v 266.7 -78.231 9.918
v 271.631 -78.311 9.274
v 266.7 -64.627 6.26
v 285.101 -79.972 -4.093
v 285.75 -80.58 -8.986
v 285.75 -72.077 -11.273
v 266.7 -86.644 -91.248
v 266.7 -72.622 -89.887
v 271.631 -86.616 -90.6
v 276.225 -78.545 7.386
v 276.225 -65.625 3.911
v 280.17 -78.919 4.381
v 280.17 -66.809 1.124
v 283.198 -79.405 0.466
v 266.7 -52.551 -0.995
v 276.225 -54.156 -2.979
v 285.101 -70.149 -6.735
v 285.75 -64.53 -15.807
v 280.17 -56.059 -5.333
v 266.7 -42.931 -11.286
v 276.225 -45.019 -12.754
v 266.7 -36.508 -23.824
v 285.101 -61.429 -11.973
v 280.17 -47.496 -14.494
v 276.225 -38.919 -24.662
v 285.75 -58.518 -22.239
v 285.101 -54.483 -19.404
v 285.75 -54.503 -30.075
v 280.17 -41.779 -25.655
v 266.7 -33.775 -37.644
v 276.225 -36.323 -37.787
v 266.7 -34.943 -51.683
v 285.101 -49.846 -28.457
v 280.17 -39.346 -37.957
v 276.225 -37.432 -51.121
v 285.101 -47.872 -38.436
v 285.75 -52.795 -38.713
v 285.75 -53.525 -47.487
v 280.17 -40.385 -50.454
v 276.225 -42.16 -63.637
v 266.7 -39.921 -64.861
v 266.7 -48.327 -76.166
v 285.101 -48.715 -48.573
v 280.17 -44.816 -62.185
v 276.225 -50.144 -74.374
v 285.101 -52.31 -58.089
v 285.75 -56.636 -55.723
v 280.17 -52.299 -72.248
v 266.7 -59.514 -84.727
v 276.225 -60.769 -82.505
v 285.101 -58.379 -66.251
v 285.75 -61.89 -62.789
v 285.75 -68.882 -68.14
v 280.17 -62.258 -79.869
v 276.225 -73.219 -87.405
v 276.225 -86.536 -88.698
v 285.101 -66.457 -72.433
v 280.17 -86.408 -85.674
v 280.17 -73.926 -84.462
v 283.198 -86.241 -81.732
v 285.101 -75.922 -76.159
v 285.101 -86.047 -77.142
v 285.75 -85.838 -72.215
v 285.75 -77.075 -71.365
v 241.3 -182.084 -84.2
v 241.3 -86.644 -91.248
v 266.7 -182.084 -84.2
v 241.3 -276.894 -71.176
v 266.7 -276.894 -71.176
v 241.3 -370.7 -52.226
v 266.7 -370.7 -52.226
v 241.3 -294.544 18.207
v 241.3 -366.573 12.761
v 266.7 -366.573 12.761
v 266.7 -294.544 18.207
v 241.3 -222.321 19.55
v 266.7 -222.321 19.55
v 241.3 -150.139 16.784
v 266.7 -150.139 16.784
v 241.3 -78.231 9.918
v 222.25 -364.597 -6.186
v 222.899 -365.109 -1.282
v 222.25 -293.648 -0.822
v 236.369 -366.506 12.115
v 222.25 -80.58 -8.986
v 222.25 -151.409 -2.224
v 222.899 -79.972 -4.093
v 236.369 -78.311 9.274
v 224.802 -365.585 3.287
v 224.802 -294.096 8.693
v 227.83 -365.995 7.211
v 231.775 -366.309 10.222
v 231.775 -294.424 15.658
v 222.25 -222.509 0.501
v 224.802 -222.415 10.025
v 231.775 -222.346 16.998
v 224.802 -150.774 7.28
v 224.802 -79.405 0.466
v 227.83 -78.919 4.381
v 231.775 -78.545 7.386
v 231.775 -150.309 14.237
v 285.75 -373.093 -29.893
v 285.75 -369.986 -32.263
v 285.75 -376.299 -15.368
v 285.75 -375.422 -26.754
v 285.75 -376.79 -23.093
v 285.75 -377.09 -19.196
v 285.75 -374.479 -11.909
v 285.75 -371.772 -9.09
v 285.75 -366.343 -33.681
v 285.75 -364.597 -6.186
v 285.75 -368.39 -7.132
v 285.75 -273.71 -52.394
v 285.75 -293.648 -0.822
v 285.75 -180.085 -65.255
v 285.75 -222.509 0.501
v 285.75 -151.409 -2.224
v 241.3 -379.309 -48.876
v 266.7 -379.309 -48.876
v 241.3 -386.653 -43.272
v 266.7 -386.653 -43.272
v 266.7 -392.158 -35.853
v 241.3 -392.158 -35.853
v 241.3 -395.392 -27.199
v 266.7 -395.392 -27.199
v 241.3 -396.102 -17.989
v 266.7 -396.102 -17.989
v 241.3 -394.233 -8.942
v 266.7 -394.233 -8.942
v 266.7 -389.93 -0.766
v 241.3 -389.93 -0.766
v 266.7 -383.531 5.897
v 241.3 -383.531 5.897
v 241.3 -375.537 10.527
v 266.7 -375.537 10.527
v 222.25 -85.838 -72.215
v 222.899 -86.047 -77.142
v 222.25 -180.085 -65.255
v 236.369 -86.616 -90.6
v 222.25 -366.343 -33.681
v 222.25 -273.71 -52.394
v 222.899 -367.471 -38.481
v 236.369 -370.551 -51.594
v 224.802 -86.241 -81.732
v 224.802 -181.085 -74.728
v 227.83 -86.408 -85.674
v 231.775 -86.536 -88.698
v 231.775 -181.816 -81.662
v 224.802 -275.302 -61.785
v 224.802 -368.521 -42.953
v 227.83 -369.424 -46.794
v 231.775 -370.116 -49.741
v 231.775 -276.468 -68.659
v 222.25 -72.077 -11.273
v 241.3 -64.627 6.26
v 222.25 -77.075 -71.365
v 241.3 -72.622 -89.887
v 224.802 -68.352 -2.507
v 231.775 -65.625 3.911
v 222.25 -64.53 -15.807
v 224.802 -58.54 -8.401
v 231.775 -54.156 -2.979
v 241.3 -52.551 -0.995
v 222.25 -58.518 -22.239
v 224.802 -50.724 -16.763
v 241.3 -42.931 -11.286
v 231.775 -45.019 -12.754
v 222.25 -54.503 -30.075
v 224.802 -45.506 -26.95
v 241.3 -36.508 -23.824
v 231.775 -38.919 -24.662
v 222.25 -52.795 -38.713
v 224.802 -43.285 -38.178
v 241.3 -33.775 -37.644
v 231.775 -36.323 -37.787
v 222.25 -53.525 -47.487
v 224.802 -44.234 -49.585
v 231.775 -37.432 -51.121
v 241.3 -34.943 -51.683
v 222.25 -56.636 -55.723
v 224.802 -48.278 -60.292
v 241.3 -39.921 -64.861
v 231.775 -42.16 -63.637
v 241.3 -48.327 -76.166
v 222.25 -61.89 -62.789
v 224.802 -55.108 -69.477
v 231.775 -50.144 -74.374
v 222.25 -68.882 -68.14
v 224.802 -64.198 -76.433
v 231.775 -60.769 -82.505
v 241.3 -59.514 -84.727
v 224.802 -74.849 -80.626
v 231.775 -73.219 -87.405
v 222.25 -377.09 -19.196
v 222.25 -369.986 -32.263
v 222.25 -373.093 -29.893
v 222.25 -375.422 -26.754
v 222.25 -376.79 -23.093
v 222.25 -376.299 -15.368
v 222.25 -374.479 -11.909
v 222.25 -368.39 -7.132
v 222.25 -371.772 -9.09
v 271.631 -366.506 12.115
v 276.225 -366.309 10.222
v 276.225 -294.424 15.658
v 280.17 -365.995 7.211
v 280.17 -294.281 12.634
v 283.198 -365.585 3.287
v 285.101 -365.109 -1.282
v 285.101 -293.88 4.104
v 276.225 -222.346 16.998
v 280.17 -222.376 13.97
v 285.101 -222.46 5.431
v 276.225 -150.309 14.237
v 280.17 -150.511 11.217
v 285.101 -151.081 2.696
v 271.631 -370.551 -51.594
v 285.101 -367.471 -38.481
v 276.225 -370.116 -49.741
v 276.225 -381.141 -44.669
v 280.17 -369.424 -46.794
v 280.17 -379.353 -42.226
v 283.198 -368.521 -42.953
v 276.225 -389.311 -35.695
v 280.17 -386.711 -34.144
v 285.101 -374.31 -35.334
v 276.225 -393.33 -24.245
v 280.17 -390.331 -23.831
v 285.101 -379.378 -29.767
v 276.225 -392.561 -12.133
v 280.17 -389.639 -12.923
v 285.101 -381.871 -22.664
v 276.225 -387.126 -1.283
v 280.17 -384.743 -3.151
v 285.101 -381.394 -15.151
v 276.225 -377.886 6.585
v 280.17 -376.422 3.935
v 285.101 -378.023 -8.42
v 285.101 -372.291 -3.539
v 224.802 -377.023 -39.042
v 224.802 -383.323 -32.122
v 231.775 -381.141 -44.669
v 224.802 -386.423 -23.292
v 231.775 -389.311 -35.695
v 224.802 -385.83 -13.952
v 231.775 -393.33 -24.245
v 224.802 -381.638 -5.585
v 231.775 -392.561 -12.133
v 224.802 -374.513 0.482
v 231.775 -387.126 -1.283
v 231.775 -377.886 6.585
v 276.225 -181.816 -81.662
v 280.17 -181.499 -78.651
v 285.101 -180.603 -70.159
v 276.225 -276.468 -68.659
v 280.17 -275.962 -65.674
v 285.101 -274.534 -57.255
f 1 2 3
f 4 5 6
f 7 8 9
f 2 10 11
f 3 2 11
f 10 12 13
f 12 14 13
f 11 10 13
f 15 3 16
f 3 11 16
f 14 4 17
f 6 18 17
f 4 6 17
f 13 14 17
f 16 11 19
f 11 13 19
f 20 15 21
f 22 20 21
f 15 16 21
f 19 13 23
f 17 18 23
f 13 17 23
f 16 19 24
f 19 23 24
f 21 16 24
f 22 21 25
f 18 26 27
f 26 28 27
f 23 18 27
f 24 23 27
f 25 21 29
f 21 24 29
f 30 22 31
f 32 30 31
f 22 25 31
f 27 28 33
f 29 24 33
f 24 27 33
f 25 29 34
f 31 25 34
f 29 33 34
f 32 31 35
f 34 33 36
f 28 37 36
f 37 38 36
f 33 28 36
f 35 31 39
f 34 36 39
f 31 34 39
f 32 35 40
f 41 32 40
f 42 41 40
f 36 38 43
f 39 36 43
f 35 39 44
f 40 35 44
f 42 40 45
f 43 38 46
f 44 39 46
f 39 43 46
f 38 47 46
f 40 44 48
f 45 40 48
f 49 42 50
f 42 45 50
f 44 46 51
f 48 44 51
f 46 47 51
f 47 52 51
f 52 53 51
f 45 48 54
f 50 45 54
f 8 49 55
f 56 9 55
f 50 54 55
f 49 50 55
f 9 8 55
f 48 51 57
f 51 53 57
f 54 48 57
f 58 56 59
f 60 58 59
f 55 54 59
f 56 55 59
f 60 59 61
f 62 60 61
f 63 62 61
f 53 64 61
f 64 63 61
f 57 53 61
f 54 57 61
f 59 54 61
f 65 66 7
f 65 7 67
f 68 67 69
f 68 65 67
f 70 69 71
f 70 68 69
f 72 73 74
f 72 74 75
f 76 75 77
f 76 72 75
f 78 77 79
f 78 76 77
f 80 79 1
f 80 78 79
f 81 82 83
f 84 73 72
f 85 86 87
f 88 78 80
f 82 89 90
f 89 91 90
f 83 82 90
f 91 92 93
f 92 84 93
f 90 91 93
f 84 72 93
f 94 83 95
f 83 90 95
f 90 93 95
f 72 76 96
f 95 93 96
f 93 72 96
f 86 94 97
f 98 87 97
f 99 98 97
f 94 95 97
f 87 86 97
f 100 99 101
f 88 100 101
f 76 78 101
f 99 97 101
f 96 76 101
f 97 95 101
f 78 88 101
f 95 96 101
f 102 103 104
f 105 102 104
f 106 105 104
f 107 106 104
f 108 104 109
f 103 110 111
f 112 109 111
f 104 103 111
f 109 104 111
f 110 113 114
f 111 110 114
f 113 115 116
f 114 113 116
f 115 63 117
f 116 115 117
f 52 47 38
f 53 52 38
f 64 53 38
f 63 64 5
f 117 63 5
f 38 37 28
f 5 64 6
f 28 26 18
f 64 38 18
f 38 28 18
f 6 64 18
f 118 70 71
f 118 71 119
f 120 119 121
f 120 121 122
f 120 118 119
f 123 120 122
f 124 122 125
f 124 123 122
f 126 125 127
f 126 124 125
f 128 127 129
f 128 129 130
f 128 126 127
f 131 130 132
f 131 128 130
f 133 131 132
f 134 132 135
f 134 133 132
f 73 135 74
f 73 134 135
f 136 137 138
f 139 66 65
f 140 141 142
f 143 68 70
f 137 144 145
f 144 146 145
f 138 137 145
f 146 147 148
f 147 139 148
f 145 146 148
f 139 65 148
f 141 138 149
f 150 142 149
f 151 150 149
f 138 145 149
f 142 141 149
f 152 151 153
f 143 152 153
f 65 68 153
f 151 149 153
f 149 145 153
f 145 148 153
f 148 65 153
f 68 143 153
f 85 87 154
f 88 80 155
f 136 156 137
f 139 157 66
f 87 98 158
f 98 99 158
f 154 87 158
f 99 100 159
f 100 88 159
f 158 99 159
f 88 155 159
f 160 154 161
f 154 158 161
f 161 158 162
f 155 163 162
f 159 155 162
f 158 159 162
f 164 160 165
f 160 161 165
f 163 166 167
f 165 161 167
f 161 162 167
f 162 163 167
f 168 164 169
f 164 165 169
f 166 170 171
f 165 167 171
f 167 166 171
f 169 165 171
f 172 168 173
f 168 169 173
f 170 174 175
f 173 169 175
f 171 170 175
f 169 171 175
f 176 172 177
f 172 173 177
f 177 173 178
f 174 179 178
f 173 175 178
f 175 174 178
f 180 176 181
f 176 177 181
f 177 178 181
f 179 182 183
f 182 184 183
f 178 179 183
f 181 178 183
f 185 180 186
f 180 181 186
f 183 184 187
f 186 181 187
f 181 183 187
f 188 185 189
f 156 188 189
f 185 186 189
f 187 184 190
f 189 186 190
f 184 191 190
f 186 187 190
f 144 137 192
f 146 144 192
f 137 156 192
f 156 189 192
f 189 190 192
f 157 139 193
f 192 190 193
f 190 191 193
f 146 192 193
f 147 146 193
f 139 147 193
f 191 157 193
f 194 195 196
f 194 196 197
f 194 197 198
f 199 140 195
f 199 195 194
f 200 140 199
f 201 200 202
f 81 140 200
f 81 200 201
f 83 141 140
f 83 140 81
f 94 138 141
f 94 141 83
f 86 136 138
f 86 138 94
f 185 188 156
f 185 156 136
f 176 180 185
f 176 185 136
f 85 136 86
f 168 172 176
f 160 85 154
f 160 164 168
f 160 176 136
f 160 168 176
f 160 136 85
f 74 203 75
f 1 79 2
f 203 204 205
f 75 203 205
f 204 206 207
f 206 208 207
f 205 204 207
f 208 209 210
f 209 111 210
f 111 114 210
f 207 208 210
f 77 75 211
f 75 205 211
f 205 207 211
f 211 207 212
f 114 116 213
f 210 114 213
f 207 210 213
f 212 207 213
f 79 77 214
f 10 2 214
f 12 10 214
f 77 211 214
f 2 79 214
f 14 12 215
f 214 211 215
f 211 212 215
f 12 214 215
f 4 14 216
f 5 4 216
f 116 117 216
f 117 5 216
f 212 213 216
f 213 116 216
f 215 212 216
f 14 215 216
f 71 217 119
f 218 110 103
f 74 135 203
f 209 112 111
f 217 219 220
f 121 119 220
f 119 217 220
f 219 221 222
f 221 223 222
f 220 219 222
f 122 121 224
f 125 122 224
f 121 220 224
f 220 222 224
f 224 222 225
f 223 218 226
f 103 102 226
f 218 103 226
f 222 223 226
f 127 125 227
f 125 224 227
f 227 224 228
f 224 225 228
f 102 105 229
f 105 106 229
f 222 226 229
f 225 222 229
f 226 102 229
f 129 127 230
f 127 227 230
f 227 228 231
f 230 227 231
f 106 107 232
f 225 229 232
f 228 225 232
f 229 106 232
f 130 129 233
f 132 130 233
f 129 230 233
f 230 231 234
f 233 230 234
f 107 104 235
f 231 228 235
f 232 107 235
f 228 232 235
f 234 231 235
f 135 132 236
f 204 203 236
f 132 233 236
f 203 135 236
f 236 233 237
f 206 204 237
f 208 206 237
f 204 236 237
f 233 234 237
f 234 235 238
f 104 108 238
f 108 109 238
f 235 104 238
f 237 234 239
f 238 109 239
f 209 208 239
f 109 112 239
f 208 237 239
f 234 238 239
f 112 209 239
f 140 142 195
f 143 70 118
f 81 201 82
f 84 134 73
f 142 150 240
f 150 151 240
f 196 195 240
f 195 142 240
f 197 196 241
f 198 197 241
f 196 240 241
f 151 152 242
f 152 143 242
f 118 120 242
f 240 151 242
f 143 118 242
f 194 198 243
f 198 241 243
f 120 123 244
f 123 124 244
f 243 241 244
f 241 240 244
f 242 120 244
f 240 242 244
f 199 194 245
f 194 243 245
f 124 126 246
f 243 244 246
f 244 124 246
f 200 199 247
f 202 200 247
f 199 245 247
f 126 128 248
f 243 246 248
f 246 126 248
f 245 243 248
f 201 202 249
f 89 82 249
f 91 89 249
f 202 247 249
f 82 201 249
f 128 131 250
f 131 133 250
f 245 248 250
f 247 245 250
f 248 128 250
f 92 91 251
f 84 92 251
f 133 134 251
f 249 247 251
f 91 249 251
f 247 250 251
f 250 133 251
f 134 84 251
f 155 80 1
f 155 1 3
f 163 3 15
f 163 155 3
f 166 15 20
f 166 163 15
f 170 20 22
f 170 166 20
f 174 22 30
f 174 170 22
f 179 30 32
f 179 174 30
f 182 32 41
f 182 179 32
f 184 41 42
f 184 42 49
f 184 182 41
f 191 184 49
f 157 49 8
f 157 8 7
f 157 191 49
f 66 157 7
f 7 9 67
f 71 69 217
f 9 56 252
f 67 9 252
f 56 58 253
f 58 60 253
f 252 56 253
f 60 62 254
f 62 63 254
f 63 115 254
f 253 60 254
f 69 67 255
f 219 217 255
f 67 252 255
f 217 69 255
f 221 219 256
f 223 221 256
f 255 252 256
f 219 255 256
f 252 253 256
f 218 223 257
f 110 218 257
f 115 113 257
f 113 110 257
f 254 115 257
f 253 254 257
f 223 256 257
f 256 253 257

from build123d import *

# Parameters (mm, degrees)
BASE_EXTRUDE_DEPTH = 31.75
FILLET1_R          = 19.05


with BuildPart() as part:
    # Sketch5 → Base-Extrude (new, symmetric)
    with BuildSketch(Plane.ZY.offset(-254)):
        with BuildLine():
            ThreePointArc((9.918396921, -78.230607992), (-44.703978299, -33.86975469), (-91.248408889, -86.643850244))
            ThreePointArc((-91.248408889, -86.643850244), (-78.432247724, -229.591476611), (-52.225916685, -370.69961275))
            ThreePointArc((-52.225916685, -370.69961275), (-17.988619307, -396.10195786), (12.760925504, -366.573375727))
            ThreePointArc((12.760925504, -366.573375727), (19.549821807, -222.321054799), (9.918396921, -78.230607992))
        make_face()
    extrude(amount=BASE_EXTRUDE_DEPTH, both=True)

    # Fillet1
    fillet1_edges = [part.edges().sort_by_distance(p)[0] for p in [
        (222.25, -229.591476611, -78.432247724),
        (222.25, -396.10195786, -17.988619307),
        (222.25, -222.321054799, 19.549821807),
        (285.75, -396.10195786, -17.988619307),
        (285.75, -229.591476611, -78.432247724),
        (285.75, -33.86975469, -44.703978299),
        (285.75, -222.321054799, 19.549821807),
        (222.25, -33.86975469, -44.703978299),
    ]]
    fillet(fillet1_edges, radius=FILLET1_R)


solid = part.part
